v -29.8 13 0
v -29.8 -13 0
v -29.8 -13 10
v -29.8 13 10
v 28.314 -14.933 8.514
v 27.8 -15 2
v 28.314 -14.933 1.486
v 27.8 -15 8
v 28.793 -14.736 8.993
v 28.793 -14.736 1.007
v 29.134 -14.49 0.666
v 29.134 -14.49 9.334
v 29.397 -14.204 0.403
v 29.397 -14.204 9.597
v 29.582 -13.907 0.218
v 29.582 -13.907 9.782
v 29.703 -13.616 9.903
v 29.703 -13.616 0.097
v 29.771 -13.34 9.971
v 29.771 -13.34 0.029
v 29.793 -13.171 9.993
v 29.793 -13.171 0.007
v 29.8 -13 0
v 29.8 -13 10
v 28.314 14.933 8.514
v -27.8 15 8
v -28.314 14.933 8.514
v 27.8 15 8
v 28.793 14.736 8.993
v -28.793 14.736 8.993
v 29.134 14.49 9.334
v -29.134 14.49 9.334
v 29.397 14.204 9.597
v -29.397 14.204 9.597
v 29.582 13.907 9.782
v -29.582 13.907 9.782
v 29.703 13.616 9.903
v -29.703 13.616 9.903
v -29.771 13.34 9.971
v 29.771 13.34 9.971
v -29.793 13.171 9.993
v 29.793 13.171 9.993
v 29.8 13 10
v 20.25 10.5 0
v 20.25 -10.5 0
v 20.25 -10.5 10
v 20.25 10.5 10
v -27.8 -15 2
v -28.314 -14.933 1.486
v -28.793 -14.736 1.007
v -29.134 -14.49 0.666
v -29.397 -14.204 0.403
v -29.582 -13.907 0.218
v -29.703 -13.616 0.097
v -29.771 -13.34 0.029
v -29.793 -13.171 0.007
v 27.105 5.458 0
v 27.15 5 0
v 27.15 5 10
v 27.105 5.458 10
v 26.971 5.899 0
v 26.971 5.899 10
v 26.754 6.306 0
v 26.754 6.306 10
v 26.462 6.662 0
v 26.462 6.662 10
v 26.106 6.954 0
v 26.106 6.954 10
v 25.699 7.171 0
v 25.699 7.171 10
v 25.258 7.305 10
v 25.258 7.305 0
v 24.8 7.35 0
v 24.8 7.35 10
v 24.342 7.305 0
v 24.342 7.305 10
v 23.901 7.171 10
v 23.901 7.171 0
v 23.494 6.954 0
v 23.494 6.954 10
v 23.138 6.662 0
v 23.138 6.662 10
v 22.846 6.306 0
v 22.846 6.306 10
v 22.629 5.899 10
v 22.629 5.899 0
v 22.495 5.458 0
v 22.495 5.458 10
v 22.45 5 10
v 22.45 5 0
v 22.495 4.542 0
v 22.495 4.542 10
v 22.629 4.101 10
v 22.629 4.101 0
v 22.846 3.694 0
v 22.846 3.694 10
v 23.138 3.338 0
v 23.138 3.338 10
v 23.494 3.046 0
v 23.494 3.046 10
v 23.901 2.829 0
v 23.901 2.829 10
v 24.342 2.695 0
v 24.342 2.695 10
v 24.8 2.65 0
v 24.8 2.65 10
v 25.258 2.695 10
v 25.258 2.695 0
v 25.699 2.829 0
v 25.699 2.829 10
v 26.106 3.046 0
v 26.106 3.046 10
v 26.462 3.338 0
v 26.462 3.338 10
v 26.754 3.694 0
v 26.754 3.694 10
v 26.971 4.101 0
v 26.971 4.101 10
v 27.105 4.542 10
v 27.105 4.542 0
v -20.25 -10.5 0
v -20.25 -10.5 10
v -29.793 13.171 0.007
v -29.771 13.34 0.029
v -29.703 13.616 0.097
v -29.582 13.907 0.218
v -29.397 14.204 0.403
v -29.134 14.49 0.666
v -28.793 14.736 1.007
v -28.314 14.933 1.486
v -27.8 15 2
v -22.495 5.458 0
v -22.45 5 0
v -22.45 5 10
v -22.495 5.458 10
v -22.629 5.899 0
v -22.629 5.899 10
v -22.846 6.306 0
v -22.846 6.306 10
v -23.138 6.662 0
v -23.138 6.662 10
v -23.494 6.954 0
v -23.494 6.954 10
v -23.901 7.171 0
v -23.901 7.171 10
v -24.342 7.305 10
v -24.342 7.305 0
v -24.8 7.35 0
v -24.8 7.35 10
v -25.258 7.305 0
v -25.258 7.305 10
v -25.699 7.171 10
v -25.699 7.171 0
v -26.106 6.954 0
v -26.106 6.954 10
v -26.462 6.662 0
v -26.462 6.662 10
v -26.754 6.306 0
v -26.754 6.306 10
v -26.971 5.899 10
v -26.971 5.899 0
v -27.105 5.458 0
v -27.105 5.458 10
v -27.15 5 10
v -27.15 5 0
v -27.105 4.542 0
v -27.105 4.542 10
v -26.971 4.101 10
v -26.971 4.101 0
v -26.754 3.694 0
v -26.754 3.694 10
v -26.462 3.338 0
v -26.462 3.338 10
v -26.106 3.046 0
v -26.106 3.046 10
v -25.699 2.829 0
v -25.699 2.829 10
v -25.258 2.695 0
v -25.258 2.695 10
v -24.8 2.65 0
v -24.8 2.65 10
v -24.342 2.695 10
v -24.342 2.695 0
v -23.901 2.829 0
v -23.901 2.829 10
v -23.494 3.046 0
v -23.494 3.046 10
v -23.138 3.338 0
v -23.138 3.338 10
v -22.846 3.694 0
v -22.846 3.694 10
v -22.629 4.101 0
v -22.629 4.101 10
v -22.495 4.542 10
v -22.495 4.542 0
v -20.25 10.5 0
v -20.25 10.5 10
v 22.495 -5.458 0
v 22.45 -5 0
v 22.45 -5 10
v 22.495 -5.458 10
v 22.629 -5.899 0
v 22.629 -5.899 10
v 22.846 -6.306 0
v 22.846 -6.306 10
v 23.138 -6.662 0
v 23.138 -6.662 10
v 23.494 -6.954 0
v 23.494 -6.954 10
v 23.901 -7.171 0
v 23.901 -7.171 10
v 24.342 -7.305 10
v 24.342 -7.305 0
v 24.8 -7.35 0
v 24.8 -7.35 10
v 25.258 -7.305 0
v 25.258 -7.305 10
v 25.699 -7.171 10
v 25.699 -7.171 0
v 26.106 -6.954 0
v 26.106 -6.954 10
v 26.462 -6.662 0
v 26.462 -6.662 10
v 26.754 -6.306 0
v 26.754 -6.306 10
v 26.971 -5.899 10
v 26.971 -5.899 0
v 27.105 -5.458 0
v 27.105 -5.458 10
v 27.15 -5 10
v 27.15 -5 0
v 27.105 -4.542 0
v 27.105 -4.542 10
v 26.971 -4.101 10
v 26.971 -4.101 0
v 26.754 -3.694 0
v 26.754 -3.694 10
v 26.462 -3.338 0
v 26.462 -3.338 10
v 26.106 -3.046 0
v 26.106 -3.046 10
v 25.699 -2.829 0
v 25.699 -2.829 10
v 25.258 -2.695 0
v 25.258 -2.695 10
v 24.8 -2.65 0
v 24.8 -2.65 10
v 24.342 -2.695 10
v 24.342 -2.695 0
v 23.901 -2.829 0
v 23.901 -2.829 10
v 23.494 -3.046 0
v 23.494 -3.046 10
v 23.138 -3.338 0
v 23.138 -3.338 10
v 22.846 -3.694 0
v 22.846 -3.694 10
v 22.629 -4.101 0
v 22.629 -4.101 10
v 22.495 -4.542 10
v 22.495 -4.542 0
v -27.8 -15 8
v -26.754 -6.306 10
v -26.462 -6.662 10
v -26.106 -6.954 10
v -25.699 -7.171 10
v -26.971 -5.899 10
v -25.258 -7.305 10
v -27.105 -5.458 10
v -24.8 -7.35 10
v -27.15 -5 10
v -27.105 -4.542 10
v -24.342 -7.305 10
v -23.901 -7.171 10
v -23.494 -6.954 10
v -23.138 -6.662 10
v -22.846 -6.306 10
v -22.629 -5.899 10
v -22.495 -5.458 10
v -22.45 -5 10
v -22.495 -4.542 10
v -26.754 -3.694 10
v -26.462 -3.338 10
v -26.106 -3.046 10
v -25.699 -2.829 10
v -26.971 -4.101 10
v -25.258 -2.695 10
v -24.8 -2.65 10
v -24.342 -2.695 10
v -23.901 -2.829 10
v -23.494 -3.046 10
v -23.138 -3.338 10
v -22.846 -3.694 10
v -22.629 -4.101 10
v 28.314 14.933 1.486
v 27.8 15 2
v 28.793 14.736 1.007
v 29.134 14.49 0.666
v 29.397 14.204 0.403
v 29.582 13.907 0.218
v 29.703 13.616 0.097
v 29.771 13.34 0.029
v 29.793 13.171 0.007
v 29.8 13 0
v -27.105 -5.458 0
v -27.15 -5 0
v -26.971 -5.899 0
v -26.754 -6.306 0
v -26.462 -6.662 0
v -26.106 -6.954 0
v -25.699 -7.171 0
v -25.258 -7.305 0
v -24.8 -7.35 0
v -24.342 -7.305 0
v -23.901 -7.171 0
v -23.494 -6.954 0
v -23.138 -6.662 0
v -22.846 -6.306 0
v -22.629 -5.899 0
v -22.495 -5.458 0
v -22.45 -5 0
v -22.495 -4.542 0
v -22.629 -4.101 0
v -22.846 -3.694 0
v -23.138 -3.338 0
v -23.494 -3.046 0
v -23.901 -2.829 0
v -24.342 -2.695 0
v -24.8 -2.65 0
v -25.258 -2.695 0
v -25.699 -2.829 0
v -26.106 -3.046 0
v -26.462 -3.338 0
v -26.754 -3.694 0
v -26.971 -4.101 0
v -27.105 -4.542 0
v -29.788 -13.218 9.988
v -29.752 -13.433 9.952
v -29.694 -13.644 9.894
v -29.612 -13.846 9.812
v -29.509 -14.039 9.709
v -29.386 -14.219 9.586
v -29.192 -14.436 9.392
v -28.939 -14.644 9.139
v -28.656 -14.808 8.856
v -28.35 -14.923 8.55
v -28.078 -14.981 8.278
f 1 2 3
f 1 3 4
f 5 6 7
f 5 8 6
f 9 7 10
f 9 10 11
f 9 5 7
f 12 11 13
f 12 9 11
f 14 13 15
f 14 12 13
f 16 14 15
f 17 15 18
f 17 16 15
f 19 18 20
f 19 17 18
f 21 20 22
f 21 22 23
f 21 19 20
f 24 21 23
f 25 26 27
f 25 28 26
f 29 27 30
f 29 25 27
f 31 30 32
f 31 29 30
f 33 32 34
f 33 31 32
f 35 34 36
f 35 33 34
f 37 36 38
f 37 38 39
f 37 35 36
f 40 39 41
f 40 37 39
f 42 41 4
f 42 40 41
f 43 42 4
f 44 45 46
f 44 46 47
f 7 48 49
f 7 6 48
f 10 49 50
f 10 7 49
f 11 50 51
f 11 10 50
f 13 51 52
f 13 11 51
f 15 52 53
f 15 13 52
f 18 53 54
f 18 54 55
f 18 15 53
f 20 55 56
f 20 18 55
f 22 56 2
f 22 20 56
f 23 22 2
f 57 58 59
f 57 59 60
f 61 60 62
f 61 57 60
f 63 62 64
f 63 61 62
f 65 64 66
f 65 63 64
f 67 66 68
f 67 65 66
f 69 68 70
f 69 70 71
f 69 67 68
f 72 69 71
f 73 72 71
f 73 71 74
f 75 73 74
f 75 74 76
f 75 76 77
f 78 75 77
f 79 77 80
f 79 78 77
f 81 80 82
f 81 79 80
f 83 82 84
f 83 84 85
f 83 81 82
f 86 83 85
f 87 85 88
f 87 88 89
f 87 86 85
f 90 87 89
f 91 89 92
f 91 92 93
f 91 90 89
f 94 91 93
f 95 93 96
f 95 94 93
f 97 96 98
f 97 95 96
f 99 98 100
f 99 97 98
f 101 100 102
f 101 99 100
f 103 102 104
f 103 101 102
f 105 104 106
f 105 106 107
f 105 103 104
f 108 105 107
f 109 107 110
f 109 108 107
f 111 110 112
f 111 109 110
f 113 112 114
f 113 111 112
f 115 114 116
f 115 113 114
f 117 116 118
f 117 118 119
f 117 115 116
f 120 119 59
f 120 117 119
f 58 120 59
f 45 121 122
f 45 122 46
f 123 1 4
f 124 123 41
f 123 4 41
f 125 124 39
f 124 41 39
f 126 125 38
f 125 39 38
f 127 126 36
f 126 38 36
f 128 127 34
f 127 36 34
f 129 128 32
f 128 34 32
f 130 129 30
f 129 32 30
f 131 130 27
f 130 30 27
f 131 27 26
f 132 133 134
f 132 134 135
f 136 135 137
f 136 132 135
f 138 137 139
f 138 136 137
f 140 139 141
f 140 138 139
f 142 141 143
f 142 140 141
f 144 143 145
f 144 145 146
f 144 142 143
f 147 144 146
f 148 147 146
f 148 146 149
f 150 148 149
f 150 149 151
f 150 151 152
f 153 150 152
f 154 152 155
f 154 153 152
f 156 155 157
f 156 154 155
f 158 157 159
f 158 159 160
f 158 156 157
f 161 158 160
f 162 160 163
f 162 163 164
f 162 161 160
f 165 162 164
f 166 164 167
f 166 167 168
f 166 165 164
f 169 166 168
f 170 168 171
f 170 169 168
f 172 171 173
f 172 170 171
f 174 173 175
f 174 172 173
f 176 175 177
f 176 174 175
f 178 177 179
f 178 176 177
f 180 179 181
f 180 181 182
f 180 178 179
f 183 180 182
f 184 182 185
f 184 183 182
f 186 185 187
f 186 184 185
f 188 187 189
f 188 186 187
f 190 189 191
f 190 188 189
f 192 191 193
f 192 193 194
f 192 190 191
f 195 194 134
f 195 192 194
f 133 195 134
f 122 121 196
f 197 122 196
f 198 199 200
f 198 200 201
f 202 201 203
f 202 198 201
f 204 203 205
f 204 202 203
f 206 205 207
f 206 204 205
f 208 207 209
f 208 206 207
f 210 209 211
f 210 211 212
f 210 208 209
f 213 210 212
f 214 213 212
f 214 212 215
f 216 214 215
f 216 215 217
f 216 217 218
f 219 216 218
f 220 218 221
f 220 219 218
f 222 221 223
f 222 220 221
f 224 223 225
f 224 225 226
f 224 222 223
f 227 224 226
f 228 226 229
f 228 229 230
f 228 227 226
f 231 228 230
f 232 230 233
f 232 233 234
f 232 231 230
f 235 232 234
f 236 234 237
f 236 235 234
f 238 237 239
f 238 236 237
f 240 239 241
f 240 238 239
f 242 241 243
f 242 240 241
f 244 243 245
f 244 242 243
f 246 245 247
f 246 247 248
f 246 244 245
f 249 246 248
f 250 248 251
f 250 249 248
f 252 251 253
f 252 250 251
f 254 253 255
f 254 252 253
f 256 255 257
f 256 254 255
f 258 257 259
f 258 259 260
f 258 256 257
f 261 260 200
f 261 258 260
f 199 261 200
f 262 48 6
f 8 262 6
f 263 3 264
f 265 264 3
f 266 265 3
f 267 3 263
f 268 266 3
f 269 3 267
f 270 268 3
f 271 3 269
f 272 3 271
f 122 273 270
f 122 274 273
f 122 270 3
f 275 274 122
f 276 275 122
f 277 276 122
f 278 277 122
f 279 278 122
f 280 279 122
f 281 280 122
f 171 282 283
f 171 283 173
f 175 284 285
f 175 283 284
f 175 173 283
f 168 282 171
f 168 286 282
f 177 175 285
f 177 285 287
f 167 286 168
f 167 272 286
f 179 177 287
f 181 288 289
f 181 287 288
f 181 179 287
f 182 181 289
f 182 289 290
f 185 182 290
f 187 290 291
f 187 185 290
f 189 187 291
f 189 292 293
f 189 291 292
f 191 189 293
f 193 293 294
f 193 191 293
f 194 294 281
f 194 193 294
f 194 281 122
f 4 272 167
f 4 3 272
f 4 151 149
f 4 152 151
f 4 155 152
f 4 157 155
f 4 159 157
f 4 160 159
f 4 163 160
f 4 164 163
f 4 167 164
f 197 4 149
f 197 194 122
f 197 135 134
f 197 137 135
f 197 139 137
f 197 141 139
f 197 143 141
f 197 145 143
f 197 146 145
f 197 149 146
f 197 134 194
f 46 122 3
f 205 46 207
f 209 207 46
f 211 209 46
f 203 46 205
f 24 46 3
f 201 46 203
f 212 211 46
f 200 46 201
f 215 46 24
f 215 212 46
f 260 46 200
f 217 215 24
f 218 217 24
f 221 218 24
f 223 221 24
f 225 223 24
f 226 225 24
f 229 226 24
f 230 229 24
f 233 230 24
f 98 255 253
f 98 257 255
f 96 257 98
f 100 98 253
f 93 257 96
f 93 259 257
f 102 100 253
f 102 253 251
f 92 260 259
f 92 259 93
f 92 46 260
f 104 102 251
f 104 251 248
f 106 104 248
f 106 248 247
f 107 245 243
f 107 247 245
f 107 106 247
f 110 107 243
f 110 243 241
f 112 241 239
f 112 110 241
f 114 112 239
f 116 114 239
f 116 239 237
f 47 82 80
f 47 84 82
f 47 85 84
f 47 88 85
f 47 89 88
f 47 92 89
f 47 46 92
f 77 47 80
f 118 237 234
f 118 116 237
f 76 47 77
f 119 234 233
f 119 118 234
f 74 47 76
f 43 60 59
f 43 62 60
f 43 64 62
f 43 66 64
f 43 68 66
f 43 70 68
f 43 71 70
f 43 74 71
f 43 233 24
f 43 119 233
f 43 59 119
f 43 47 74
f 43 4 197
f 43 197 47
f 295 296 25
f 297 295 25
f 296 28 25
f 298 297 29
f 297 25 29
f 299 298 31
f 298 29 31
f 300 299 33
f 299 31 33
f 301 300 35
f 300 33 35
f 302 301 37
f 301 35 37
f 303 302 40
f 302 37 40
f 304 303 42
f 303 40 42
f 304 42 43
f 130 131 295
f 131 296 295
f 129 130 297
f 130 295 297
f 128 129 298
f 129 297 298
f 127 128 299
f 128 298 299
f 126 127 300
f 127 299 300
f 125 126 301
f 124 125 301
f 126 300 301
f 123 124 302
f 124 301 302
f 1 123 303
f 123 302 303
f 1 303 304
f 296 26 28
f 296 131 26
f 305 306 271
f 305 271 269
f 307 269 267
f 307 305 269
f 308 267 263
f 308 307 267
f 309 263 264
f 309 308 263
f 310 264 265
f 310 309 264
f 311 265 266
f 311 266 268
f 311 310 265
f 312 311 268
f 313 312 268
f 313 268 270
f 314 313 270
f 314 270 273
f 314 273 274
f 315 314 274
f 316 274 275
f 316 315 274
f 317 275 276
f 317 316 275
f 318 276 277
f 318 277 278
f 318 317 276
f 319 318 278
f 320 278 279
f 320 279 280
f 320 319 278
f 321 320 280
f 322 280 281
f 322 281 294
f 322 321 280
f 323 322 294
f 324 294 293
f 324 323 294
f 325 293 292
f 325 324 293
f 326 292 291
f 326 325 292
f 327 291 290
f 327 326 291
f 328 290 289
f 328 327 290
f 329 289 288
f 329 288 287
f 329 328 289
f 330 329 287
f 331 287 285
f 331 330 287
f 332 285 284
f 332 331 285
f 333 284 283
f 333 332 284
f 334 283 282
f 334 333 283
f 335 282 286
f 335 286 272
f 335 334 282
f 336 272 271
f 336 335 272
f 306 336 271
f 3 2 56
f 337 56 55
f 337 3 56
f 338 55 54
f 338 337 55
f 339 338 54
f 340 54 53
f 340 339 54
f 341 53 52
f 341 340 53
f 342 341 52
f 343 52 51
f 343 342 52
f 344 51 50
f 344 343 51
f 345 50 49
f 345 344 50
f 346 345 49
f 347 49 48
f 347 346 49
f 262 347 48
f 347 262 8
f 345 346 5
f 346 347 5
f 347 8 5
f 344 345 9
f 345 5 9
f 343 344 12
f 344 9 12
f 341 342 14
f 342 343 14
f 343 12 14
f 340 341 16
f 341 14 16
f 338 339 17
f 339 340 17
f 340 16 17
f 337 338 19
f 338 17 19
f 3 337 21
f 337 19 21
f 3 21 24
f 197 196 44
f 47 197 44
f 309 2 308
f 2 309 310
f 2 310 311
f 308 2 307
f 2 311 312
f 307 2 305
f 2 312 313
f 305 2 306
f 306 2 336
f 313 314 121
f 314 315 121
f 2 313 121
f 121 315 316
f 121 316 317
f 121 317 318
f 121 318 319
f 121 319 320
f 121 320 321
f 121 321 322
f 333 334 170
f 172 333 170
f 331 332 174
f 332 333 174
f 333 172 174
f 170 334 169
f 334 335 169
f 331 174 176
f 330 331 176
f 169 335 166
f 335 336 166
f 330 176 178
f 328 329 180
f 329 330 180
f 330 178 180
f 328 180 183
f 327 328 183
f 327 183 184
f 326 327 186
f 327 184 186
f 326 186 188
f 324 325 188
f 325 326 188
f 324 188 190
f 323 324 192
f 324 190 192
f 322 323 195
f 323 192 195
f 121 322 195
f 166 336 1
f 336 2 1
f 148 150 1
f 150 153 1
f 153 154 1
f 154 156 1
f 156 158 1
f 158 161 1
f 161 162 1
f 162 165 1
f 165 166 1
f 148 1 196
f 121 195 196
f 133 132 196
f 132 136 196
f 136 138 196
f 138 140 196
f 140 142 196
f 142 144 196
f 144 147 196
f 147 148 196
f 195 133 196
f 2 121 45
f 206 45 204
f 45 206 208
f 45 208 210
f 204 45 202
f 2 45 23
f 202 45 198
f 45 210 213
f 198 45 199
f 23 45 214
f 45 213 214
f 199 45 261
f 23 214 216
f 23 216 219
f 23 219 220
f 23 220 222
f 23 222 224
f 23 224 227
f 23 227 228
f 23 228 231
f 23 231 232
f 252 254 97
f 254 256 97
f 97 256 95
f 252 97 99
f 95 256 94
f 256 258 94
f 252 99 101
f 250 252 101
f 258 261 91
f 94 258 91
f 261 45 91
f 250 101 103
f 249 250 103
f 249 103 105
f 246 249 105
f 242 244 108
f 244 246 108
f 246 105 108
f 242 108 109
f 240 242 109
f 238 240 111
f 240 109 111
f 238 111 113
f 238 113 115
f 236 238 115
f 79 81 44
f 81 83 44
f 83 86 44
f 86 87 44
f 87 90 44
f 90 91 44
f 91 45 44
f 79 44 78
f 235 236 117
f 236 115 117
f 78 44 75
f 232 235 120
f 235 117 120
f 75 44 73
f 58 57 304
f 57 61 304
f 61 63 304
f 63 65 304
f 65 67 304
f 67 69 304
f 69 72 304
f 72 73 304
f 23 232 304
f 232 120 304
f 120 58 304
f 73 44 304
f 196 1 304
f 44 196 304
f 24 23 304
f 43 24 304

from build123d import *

# Parameters (mm, degrees)
SKETCH1_W           = 59.6
SKETCH1_H           = 30
SKETCH1_R           = 2.35
SKETCH1_W_2         = 40.5
SKETCH1_H_2         = 21
BOSS_EXTRUDE1_DEPTH = 10
FILLET1_R           = 2


with BuildPart() as part:
    # Sketch1 → Boss-Extrude1 (new body)
    with BuildSketch(Plane.XY):
        Rectangle(SKETCH1_W, SKETCH1_H)
        with Locations((-24.8, 5)):
            Circle(SKETCH1_R, mode=Mode.SUBTRACT)
        with Locations((24.8, 5)):
            Circle(SKETCH1_R, mode=Mode.SUBTRACT)
        with Locations(Location((24.8, -5, 0), (0, 0, 180))):
            Circle(SKETCH1_R, mode=Mode.SUBTRACT)
        with Locations(Location((-24.8, -5, 0), (0, 0, 180))):
            Circle(SKETCH1_R, mode=Mode.SUBTRACT)
        Rectangle(SKETCH1_W_2, SKETCH1_H_2, mode=Mode.SUBTRACT)
    extrude(amount=BOSS_EXTRUDE1_DEPTH)

    # Fillet1
    fillet1_edges = [part.edges().sort_by_distance(p)[0] for p in [
        (0, 15, 10),
        (0, 15, 0),
        (0, -15, 0),
        (-29.8, 15, 5),
        (29.8, 15, 5),
        (29.8, -15, 5),
        (-29.8, -15, 5),
        (0, -15, 10),
    ]]
    fillet(fillet1_edges, radius=FILLET1_R)


solid = part.part
